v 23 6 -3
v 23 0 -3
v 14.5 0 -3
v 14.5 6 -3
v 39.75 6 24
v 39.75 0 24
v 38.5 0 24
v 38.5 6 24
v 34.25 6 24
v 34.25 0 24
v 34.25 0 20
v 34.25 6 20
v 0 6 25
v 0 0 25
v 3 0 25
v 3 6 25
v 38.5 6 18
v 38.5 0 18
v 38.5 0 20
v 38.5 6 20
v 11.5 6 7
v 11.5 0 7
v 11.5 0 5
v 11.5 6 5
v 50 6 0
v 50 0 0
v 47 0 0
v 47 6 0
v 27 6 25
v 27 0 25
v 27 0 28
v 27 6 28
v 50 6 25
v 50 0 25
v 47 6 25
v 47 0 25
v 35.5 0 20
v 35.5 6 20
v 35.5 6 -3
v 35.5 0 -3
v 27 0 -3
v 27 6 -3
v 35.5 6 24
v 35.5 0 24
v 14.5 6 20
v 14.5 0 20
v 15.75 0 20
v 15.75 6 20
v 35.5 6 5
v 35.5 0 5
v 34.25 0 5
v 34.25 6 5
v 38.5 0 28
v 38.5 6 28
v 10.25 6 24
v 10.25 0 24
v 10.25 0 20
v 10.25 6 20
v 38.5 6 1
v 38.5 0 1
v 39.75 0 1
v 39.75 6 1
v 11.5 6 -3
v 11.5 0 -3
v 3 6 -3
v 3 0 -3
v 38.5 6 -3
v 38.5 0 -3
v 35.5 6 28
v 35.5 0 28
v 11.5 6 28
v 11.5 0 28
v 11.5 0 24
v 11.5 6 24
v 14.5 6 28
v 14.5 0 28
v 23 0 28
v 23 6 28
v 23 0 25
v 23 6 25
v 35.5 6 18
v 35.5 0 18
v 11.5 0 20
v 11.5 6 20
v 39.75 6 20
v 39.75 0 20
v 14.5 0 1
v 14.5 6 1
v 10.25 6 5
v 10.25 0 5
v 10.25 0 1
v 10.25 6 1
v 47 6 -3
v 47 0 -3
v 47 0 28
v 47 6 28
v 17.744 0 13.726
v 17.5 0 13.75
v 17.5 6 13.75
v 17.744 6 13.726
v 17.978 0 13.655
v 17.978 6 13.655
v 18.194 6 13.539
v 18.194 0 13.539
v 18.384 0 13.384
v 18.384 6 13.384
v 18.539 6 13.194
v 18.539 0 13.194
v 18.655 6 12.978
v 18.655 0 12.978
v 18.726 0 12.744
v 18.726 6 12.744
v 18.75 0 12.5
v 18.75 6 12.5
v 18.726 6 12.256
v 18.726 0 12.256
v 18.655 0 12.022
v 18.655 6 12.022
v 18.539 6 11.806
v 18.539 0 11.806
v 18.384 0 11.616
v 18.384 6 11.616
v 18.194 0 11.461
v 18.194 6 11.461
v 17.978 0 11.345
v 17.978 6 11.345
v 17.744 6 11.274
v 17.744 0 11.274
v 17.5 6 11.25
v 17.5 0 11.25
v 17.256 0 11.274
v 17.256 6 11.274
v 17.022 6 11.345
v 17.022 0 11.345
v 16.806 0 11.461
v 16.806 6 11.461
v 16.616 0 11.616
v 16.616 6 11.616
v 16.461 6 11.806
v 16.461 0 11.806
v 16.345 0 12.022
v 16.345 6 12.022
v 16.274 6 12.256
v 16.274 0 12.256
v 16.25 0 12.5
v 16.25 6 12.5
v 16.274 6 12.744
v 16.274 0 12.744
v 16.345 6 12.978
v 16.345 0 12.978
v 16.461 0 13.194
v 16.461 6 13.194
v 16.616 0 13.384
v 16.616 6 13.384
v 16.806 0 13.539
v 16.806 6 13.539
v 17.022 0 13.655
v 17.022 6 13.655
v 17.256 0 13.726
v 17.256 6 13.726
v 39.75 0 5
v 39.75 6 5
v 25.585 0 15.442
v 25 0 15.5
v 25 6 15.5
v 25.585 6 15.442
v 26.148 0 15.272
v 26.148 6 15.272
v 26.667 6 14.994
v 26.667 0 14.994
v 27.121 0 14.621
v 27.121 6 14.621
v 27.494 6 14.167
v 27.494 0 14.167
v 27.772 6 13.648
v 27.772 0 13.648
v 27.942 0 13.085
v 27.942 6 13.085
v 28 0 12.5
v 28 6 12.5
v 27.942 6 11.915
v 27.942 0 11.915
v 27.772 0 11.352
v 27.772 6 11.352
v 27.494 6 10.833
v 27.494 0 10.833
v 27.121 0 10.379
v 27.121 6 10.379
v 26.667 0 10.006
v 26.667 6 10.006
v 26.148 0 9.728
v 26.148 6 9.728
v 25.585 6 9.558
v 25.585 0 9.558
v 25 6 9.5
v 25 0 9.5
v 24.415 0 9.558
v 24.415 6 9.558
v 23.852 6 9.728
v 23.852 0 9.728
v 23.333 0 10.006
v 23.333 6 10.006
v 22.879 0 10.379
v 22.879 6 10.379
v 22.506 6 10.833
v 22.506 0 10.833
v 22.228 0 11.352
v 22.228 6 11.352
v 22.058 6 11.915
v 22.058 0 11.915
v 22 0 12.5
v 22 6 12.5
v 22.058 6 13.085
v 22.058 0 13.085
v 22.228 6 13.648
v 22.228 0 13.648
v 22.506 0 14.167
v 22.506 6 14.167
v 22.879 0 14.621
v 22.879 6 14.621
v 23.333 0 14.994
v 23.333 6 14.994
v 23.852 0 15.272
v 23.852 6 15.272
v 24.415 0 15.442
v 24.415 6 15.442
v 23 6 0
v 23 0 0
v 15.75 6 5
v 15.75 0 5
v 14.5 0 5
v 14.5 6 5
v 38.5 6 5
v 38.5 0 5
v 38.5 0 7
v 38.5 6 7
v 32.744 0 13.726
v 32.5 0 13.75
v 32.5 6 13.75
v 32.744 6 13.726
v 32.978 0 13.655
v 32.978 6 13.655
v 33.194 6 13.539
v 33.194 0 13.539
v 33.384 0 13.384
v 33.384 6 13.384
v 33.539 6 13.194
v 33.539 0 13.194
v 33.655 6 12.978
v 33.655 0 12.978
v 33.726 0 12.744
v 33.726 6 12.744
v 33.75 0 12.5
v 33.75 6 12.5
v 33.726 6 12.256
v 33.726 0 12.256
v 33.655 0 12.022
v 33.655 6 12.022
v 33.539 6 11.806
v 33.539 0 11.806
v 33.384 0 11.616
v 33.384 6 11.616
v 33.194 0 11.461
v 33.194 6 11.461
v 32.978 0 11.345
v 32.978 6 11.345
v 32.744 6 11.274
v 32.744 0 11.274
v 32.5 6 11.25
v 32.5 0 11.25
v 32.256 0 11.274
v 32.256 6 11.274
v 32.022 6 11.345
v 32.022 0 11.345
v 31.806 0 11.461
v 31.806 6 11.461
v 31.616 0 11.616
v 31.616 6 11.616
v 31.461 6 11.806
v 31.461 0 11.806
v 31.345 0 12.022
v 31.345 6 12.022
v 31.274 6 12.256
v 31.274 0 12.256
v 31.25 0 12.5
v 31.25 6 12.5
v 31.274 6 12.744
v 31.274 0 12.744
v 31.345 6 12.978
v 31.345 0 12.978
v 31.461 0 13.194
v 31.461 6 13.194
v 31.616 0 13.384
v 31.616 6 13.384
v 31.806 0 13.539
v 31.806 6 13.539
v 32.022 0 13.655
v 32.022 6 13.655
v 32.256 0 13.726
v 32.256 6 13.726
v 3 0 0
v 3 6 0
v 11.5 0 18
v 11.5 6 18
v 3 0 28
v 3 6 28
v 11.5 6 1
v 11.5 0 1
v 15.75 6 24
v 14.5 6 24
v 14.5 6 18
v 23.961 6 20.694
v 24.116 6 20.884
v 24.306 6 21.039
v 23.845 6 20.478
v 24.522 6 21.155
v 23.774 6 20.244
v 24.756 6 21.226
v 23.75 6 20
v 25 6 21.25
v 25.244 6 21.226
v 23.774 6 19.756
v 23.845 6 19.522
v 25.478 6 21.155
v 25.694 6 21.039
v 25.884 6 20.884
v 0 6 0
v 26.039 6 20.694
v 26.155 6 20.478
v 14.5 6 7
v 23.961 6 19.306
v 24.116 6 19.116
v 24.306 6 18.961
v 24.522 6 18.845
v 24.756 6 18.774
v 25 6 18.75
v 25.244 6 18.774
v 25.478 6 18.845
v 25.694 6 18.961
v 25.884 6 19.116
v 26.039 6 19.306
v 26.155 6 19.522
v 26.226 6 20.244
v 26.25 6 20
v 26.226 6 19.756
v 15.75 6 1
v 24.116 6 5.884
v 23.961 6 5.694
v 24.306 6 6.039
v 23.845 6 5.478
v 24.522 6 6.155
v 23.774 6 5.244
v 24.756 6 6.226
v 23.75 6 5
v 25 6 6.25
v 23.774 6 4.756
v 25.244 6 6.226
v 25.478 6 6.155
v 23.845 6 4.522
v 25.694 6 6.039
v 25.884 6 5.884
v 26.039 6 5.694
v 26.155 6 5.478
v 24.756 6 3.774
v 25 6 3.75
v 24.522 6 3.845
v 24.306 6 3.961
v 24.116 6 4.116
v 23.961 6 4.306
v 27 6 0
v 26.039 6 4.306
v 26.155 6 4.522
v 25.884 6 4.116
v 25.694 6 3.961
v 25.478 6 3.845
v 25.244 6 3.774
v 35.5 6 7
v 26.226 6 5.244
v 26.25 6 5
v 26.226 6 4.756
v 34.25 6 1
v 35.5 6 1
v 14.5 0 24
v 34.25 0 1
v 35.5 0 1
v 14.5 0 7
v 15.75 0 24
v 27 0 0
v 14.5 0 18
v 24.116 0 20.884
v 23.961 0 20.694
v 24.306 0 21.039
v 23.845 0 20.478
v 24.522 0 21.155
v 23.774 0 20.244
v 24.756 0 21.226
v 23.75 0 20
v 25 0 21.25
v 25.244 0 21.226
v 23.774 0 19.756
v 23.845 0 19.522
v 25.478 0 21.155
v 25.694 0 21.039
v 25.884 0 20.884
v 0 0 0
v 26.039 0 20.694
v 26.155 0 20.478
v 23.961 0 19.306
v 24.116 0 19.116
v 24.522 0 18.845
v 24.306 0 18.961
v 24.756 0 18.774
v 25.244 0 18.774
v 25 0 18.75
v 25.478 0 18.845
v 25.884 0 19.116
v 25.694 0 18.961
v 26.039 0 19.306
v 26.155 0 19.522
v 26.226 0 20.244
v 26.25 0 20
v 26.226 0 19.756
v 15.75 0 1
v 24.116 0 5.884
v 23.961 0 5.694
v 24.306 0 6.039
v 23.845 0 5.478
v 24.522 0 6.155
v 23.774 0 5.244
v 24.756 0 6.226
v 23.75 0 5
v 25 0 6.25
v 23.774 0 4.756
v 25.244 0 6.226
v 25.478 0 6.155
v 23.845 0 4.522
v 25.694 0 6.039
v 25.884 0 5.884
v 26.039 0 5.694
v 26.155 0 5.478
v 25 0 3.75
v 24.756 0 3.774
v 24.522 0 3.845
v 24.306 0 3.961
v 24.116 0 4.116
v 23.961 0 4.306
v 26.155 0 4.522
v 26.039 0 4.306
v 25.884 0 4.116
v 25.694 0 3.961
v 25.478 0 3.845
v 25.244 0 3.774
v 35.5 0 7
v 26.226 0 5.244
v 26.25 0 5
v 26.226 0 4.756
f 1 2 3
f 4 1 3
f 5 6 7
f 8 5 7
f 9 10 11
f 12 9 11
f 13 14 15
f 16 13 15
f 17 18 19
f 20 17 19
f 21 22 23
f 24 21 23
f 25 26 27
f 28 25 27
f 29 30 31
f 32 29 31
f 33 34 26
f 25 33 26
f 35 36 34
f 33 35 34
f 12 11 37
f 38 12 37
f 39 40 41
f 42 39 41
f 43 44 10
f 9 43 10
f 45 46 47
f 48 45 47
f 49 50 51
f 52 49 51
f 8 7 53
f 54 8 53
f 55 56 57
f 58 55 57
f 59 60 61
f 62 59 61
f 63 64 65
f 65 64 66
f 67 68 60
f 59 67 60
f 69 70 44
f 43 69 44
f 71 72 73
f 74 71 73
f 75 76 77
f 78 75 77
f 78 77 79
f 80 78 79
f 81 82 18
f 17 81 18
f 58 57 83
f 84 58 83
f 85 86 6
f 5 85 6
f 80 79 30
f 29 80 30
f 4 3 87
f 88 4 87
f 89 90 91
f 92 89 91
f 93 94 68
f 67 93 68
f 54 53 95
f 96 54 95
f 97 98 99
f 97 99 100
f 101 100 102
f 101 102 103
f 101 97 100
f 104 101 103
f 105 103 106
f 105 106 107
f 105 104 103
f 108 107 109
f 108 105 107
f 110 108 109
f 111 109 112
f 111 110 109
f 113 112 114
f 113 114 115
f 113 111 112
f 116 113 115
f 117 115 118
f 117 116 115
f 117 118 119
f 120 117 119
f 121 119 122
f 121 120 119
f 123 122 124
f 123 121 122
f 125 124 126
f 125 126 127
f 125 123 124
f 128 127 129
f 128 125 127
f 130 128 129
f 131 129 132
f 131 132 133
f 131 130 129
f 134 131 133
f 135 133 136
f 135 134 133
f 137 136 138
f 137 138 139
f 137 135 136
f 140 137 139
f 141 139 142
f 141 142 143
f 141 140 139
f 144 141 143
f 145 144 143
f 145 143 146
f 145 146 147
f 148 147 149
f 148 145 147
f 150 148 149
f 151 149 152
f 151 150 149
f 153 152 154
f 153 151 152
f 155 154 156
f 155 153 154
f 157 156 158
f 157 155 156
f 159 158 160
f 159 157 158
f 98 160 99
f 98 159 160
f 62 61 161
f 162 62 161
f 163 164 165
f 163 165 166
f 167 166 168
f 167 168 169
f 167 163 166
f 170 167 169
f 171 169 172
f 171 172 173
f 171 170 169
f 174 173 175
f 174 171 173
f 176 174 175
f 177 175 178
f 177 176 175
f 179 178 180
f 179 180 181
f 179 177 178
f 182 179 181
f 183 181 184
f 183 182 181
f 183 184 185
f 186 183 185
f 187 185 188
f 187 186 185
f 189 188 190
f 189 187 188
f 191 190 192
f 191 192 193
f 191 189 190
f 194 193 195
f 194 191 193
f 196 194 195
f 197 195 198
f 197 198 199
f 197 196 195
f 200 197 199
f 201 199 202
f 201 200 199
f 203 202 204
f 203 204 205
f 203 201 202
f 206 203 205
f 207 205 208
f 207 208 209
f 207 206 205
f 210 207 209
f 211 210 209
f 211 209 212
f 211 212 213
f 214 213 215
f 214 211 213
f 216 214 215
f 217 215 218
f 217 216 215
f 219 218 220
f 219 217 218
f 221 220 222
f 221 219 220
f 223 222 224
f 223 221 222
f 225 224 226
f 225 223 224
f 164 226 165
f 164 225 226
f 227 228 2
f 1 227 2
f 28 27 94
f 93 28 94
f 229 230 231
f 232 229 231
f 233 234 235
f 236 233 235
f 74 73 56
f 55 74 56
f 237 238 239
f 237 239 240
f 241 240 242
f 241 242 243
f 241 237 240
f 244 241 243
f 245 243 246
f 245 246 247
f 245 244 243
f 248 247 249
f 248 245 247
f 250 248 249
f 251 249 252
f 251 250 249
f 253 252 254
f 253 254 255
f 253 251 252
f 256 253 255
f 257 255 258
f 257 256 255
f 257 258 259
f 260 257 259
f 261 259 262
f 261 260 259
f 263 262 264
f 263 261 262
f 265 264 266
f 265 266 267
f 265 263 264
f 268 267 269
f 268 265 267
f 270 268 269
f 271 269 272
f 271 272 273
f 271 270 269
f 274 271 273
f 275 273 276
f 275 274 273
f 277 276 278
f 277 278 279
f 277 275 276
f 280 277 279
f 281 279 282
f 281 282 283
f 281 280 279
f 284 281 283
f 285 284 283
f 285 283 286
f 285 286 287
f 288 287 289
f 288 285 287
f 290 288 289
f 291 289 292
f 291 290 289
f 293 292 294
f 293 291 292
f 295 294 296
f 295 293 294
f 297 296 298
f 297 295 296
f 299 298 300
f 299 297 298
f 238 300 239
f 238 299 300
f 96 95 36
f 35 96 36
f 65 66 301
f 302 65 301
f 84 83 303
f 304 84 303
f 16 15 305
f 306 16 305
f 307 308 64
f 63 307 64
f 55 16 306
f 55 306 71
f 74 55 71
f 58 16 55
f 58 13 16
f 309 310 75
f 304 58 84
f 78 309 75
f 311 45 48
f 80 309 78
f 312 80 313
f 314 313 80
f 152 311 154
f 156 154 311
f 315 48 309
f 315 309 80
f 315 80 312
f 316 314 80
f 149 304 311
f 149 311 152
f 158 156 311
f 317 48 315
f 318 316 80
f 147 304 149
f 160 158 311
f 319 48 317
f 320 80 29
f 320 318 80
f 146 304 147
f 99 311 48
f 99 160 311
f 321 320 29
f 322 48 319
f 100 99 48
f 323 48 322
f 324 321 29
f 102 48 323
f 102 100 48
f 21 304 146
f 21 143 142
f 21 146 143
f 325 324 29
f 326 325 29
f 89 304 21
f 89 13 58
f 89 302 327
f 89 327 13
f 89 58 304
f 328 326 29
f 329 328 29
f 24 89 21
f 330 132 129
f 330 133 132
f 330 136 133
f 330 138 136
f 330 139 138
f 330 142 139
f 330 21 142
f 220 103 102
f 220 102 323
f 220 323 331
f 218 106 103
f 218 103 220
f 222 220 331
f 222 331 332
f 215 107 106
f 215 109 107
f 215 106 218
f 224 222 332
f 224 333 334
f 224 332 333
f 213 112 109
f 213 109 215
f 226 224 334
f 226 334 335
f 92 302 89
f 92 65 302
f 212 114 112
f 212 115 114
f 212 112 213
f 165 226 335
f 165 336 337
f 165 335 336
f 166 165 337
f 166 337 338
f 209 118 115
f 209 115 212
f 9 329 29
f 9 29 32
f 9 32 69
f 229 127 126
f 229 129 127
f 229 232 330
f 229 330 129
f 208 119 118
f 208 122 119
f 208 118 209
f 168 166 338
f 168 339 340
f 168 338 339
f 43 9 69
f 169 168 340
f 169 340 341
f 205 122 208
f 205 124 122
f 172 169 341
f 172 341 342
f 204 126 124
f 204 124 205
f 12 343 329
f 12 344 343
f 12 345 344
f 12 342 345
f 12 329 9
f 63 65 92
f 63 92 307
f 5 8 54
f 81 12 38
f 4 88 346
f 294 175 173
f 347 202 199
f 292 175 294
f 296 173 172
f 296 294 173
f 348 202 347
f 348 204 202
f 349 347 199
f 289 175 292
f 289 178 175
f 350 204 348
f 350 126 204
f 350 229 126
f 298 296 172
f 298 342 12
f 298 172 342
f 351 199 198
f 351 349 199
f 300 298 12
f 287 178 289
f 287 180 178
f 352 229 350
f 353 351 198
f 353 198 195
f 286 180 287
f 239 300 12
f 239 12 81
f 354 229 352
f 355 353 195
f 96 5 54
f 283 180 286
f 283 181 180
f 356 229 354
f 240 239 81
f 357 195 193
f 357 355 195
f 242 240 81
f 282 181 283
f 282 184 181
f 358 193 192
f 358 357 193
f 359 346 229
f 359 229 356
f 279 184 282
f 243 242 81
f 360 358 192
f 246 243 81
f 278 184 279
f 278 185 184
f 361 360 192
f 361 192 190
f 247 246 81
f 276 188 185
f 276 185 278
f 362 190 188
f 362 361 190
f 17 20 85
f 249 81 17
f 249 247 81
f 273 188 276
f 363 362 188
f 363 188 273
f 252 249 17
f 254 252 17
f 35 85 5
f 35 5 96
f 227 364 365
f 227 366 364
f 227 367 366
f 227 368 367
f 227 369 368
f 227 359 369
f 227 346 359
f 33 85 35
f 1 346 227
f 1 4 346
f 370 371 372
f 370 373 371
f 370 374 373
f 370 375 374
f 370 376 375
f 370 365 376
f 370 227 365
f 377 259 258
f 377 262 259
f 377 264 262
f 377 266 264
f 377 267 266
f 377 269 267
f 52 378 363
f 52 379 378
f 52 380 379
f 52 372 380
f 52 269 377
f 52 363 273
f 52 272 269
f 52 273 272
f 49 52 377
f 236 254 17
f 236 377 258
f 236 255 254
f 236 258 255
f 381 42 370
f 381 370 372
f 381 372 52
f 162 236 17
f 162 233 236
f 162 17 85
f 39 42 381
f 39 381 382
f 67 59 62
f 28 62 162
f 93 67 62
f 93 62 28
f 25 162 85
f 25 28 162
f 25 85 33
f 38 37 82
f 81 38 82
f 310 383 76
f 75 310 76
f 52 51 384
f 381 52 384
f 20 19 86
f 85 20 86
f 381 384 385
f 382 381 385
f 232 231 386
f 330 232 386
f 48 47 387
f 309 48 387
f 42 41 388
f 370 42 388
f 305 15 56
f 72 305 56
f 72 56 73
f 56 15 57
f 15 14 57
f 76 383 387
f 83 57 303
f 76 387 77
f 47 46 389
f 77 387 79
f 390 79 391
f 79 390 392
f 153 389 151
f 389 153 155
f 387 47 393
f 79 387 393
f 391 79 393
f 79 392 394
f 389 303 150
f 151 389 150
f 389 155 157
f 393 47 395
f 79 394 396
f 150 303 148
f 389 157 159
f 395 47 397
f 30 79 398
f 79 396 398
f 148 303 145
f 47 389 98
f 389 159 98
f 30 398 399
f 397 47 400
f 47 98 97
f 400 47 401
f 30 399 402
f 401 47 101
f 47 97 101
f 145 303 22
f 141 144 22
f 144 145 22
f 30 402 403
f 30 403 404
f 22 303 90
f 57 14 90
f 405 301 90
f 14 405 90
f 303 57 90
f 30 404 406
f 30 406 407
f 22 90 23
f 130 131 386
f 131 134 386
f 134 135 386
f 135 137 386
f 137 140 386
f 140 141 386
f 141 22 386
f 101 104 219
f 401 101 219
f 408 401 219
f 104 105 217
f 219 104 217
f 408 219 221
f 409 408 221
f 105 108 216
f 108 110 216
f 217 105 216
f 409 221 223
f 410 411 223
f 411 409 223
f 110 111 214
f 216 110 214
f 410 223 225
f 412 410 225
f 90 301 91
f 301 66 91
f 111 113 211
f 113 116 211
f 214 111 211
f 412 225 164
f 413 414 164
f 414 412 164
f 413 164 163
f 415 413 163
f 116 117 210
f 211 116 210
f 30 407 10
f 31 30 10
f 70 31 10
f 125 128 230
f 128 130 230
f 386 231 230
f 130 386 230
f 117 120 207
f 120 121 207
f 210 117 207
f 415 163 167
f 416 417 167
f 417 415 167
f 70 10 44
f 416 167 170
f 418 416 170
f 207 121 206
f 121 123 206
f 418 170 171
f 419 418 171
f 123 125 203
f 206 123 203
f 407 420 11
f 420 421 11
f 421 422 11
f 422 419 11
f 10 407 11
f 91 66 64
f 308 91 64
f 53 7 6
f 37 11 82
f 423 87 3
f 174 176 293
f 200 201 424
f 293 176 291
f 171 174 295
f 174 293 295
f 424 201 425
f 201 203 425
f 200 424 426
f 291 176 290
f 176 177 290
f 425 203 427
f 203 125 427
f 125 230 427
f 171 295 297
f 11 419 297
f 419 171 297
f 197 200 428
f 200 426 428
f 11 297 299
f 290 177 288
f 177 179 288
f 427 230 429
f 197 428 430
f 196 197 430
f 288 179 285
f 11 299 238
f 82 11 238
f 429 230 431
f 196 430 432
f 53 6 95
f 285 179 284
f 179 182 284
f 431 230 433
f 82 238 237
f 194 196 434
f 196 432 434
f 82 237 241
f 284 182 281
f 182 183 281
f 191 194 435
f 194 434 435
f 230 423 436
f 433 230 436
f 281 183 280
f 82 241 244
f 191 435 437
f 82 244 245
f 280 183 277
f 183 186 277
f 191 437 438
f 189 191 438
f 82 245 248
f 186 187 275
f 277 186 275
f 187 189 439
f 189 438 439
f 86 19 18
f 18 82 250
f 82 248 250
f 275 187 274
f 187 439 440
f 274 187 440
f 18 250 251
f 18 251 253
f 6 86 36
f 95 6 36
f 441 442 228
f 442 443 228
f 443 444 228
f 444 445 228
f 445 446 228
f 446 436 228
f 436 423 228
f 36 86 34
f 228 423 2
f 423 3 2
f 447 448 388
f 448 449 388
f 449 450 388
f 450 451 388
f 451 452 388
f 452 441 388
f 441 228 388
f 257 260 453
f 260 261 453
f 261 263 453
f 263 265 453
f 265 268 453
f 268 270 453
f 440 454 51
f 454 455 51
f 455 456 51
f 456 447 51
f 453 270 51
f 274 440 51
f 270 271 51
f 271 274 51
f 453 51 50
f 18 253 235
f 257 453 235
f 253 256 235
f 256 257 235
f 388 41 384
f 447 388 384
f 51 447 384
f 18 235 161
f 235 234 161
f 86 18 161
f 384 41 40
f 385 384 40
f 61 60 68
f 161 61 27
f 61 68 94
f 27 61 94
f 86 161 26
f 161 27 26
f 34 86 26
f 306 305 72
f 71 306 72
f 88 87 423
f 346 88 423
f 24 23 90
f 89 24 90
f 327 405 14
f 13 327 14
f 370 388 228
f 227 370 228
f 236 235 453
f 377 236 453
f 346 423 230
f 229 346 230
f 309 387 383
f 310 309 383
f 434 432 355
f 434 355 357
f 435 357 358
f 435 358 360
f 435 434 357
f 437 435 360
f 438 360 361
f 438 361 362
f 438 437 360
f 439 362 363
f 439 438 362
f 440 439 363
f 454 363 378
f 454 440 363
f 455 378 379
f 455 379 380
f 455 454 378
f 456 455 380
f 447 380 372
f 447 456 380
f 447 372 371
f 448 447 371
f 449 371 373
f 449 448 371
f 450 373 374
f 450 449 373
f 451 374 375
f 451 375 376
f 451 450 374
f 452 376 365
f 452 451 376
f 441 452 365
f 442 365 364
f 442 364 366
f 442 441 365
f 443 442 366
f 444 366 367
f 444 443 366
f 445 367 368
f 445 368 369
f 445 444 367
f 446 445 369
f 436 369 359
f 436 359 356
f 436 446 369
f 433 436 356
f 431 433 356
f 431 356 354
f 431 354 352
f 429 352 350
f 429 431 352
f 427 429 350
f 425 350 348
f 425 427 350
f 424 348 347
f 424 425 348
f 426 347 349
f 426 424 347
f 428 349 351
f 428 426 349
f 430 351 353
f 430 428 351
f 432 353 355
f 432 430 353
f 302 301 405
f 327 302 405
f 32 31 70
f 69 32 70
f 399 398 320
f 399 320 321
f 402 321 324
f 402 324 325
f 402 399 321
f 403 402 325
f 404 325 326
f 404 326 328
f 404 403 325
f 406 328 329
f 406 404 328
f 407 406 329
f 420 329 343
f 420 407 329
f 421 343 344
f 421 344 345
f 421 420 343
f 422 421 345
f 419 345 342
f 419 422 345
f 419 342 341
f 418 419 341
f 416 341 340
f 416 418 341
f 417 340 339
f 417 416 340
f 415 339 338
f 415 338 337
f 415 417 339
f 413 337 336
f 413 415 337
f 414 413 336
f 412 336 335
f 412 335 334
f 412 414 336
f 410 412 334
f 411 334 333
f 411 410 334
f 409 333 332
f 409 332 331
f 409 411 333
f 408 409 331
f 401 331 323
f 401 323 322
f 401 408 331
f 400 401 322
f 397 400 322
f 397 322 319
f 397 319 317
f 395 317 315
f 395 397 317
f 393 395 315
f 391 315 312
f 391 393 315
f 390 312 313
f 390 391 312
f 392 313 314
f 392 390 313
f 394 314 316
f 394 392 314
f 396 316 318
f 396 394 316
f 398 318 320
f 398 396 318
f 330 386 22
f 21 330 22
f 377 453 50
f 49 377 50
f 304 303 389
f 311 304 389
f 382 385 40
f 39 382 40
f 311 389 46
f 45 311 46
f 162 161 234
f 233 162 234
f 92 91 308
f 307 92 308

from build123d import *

# Parameters (mm, degrees)
SKETCH_1_R      = 1.25
SKETCH_1_R_2    = 3
EXTRUDE_1_DEPTH = 6


with BuildPart() as part:
    # 草图1 → 凸台-拉伸1 (new body)
    with BuildSketch(Plane(origin=(0, 0, 0), x_dir=(1, 0, 0), z_dir=(0, 1, 0))):
        Polygon((35.5, -24), (34.25, -24), (34.25, -20), (35.5, -20), (35.5, -18), (38.5, -18), (38.5, -20), (39.75, -20), (39.75, -24), (38.5, -24), (38.5, -28), (47, -28), (47, -25), (50, -25), (50, 0), (47, 0), (47, 3), (38.5, 3), (38.5, -1), (39.75, -1), (39.75, -5), (38.5, -5), (38.5, -7), (35.5, -7), (35.5, -5), (34.25, -5), (34.25, -1), (35.5, -1), (35.5, 3), (27, 3), (27, 0), (23, 0), (23, 3), (14.5, 3), (14.5, -1), (15.75, -1), (15.75, -5), (14.5, -5), (14.5, -7), (11.5, -7), (11.5, -5), (10.25, -5), (10.25, -1), (11.5, -1), (11.5, 3), (3, 3), (3, 0), (0, 0), (0, -25), (3, -25), (3, -28), (11.5, -28), (11.5, -24), (10.25, -24), (10.25, -20), (11.5, -20), (11.5, -18), (14.5, -18), (14.5, -20), (15.75, -20), (15.75, -24), (14.5, -24), (14.5, -28), (23, -28), (23, -25), (27, -25), (27, -28), (35.5, -28), align=None)
        with Locations(Location((32.5, -12.5, 0), (0, 0, 270))):
            Circle(SKETCH_1_R, mode=Mode.SUBTRACT)
        with Locations(Location((25, -12.5, 0), (0, 0, 270))):
            Circle(SKETCH_1_R_2, mode=Mode.SUBTRACT)
        with Locations(Location((17.5, -12.5, 0), (0, 0, 270))):
            Circle(SKETCH_1_R, mode=Mode.SUBTRACT)
        with Locations(Location((25, -20, 0), (0, 0, 270))):
            Circle(SKETCH_1_R, mode=Mode.SUBTRACT)
        with Locations(Location((25, -5, 0), (0, 0, 270))):
            Circle(SKETCH_1_R, mode=Mode.SUBTRACT)
    extrude(amount=EXTRUDE_1_DEPTH)


solid = part.part
